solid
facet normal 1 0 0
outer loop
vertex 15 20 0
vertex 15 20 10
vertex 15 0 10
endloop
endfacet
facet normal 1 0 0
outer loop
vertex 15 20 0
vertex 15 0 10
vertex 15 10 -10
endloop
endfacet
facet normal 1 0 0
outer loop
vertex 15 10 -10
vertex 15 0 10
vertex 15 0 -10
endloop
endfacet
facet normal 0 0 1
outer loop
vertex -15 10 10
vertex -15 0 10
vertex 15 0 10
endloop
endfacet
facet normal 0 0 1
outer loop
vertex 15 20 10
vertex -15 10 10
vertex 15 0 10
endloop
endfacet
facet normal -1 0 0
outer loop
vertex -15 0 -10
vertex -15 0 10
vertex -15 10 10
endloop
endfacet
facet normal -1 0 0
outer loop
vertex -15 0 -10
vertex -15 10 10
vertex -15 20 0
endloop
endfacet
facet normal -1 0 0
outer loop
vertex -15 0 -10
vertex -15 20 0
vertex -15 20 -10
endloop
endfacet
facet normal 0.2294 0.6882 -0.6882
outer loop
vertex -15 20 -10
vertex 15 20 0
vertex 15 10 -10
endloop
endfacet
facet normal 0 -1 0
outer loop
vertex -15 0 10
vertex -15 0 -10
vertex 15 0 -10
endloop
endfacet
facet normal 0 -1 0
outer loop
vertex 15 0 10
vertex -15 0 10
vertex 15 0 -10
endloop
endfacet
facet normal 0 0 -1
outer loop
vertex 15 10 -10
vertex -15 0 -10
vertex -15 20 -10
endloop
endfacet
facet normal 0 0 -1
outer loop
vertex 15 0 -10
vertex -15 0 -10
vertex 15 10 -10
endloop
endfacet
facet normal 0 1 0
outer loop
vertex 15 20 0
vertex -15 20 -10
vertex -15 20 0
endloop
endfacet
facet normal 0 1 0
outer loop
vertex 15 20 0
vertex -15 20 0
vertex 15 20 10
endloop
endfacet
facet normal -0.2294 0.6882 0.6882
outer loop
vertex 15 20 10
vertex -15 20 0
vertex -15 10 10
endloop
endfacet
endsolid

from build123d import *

# Parameters (mm, degrees)
SKETCH_1_W          = 30
SKETCH_1_H          = 20
EXTRUDE_1_DEPTH     = 20
CUT_EXTRUDE_1_DEPTH = 20
SKETCH_10_W         = 32.252295377
SKETCH_10_H         = 15.179180951
CUT_EXTRUDE_2_DEPTH = 25


with BuildPart() as part:
    # 草圖1 → 填料-伸長1 (new body)
    with BuildSketch(Plane(origin=(0, 0, 0), x_dir=(1, 0, 0), z_dir=(0, 1, 0))):
        Rectangle(SKETCH_1_W, SKETCH_1_H)
    extrude(amount=EXTRUDE_1_DEPTH)

    # 草圖6 → 除料-伸長1 (cut)
    with BuildSketch(Plane(origin=(3.947368421, 11.842105263, -11.842105263), x_dir=(0.973328527, -0.162221421, 0.162221421), z_dir=(-0.229415734, -0.688247202, 0.688247202))):
        Polygon((0, 0), (-20.538761547, 0), (-20.538761547, 12.535207186), (11.71353383, 14.625633738), (12.268136792, -0.263322726), align=None)
    extrude(amount=-CUT_EXTRUDE_1_DEPTH, mode=Mode.SUBTRACT)

    # 草圖10 → 除料-伸長2 (cut)
    with BuildSketch(Plane(origin=(-3.947368421, 11.842105263, 11.842105263), x_dir=(0.973328527, 0.162221421, 0.162221421), z_dir=(-0.229415734, 0.688247202, 0.688247202))):
        with Locations((3.943334428, 7.114500239)):
            Rectangle(SKETCH_10_W, SKETCH_10_H)
    extrude(amount=CUT_EXTRUDE_2_DEPTH, mode=Mode.SUBTRACT)


solid = part.part
